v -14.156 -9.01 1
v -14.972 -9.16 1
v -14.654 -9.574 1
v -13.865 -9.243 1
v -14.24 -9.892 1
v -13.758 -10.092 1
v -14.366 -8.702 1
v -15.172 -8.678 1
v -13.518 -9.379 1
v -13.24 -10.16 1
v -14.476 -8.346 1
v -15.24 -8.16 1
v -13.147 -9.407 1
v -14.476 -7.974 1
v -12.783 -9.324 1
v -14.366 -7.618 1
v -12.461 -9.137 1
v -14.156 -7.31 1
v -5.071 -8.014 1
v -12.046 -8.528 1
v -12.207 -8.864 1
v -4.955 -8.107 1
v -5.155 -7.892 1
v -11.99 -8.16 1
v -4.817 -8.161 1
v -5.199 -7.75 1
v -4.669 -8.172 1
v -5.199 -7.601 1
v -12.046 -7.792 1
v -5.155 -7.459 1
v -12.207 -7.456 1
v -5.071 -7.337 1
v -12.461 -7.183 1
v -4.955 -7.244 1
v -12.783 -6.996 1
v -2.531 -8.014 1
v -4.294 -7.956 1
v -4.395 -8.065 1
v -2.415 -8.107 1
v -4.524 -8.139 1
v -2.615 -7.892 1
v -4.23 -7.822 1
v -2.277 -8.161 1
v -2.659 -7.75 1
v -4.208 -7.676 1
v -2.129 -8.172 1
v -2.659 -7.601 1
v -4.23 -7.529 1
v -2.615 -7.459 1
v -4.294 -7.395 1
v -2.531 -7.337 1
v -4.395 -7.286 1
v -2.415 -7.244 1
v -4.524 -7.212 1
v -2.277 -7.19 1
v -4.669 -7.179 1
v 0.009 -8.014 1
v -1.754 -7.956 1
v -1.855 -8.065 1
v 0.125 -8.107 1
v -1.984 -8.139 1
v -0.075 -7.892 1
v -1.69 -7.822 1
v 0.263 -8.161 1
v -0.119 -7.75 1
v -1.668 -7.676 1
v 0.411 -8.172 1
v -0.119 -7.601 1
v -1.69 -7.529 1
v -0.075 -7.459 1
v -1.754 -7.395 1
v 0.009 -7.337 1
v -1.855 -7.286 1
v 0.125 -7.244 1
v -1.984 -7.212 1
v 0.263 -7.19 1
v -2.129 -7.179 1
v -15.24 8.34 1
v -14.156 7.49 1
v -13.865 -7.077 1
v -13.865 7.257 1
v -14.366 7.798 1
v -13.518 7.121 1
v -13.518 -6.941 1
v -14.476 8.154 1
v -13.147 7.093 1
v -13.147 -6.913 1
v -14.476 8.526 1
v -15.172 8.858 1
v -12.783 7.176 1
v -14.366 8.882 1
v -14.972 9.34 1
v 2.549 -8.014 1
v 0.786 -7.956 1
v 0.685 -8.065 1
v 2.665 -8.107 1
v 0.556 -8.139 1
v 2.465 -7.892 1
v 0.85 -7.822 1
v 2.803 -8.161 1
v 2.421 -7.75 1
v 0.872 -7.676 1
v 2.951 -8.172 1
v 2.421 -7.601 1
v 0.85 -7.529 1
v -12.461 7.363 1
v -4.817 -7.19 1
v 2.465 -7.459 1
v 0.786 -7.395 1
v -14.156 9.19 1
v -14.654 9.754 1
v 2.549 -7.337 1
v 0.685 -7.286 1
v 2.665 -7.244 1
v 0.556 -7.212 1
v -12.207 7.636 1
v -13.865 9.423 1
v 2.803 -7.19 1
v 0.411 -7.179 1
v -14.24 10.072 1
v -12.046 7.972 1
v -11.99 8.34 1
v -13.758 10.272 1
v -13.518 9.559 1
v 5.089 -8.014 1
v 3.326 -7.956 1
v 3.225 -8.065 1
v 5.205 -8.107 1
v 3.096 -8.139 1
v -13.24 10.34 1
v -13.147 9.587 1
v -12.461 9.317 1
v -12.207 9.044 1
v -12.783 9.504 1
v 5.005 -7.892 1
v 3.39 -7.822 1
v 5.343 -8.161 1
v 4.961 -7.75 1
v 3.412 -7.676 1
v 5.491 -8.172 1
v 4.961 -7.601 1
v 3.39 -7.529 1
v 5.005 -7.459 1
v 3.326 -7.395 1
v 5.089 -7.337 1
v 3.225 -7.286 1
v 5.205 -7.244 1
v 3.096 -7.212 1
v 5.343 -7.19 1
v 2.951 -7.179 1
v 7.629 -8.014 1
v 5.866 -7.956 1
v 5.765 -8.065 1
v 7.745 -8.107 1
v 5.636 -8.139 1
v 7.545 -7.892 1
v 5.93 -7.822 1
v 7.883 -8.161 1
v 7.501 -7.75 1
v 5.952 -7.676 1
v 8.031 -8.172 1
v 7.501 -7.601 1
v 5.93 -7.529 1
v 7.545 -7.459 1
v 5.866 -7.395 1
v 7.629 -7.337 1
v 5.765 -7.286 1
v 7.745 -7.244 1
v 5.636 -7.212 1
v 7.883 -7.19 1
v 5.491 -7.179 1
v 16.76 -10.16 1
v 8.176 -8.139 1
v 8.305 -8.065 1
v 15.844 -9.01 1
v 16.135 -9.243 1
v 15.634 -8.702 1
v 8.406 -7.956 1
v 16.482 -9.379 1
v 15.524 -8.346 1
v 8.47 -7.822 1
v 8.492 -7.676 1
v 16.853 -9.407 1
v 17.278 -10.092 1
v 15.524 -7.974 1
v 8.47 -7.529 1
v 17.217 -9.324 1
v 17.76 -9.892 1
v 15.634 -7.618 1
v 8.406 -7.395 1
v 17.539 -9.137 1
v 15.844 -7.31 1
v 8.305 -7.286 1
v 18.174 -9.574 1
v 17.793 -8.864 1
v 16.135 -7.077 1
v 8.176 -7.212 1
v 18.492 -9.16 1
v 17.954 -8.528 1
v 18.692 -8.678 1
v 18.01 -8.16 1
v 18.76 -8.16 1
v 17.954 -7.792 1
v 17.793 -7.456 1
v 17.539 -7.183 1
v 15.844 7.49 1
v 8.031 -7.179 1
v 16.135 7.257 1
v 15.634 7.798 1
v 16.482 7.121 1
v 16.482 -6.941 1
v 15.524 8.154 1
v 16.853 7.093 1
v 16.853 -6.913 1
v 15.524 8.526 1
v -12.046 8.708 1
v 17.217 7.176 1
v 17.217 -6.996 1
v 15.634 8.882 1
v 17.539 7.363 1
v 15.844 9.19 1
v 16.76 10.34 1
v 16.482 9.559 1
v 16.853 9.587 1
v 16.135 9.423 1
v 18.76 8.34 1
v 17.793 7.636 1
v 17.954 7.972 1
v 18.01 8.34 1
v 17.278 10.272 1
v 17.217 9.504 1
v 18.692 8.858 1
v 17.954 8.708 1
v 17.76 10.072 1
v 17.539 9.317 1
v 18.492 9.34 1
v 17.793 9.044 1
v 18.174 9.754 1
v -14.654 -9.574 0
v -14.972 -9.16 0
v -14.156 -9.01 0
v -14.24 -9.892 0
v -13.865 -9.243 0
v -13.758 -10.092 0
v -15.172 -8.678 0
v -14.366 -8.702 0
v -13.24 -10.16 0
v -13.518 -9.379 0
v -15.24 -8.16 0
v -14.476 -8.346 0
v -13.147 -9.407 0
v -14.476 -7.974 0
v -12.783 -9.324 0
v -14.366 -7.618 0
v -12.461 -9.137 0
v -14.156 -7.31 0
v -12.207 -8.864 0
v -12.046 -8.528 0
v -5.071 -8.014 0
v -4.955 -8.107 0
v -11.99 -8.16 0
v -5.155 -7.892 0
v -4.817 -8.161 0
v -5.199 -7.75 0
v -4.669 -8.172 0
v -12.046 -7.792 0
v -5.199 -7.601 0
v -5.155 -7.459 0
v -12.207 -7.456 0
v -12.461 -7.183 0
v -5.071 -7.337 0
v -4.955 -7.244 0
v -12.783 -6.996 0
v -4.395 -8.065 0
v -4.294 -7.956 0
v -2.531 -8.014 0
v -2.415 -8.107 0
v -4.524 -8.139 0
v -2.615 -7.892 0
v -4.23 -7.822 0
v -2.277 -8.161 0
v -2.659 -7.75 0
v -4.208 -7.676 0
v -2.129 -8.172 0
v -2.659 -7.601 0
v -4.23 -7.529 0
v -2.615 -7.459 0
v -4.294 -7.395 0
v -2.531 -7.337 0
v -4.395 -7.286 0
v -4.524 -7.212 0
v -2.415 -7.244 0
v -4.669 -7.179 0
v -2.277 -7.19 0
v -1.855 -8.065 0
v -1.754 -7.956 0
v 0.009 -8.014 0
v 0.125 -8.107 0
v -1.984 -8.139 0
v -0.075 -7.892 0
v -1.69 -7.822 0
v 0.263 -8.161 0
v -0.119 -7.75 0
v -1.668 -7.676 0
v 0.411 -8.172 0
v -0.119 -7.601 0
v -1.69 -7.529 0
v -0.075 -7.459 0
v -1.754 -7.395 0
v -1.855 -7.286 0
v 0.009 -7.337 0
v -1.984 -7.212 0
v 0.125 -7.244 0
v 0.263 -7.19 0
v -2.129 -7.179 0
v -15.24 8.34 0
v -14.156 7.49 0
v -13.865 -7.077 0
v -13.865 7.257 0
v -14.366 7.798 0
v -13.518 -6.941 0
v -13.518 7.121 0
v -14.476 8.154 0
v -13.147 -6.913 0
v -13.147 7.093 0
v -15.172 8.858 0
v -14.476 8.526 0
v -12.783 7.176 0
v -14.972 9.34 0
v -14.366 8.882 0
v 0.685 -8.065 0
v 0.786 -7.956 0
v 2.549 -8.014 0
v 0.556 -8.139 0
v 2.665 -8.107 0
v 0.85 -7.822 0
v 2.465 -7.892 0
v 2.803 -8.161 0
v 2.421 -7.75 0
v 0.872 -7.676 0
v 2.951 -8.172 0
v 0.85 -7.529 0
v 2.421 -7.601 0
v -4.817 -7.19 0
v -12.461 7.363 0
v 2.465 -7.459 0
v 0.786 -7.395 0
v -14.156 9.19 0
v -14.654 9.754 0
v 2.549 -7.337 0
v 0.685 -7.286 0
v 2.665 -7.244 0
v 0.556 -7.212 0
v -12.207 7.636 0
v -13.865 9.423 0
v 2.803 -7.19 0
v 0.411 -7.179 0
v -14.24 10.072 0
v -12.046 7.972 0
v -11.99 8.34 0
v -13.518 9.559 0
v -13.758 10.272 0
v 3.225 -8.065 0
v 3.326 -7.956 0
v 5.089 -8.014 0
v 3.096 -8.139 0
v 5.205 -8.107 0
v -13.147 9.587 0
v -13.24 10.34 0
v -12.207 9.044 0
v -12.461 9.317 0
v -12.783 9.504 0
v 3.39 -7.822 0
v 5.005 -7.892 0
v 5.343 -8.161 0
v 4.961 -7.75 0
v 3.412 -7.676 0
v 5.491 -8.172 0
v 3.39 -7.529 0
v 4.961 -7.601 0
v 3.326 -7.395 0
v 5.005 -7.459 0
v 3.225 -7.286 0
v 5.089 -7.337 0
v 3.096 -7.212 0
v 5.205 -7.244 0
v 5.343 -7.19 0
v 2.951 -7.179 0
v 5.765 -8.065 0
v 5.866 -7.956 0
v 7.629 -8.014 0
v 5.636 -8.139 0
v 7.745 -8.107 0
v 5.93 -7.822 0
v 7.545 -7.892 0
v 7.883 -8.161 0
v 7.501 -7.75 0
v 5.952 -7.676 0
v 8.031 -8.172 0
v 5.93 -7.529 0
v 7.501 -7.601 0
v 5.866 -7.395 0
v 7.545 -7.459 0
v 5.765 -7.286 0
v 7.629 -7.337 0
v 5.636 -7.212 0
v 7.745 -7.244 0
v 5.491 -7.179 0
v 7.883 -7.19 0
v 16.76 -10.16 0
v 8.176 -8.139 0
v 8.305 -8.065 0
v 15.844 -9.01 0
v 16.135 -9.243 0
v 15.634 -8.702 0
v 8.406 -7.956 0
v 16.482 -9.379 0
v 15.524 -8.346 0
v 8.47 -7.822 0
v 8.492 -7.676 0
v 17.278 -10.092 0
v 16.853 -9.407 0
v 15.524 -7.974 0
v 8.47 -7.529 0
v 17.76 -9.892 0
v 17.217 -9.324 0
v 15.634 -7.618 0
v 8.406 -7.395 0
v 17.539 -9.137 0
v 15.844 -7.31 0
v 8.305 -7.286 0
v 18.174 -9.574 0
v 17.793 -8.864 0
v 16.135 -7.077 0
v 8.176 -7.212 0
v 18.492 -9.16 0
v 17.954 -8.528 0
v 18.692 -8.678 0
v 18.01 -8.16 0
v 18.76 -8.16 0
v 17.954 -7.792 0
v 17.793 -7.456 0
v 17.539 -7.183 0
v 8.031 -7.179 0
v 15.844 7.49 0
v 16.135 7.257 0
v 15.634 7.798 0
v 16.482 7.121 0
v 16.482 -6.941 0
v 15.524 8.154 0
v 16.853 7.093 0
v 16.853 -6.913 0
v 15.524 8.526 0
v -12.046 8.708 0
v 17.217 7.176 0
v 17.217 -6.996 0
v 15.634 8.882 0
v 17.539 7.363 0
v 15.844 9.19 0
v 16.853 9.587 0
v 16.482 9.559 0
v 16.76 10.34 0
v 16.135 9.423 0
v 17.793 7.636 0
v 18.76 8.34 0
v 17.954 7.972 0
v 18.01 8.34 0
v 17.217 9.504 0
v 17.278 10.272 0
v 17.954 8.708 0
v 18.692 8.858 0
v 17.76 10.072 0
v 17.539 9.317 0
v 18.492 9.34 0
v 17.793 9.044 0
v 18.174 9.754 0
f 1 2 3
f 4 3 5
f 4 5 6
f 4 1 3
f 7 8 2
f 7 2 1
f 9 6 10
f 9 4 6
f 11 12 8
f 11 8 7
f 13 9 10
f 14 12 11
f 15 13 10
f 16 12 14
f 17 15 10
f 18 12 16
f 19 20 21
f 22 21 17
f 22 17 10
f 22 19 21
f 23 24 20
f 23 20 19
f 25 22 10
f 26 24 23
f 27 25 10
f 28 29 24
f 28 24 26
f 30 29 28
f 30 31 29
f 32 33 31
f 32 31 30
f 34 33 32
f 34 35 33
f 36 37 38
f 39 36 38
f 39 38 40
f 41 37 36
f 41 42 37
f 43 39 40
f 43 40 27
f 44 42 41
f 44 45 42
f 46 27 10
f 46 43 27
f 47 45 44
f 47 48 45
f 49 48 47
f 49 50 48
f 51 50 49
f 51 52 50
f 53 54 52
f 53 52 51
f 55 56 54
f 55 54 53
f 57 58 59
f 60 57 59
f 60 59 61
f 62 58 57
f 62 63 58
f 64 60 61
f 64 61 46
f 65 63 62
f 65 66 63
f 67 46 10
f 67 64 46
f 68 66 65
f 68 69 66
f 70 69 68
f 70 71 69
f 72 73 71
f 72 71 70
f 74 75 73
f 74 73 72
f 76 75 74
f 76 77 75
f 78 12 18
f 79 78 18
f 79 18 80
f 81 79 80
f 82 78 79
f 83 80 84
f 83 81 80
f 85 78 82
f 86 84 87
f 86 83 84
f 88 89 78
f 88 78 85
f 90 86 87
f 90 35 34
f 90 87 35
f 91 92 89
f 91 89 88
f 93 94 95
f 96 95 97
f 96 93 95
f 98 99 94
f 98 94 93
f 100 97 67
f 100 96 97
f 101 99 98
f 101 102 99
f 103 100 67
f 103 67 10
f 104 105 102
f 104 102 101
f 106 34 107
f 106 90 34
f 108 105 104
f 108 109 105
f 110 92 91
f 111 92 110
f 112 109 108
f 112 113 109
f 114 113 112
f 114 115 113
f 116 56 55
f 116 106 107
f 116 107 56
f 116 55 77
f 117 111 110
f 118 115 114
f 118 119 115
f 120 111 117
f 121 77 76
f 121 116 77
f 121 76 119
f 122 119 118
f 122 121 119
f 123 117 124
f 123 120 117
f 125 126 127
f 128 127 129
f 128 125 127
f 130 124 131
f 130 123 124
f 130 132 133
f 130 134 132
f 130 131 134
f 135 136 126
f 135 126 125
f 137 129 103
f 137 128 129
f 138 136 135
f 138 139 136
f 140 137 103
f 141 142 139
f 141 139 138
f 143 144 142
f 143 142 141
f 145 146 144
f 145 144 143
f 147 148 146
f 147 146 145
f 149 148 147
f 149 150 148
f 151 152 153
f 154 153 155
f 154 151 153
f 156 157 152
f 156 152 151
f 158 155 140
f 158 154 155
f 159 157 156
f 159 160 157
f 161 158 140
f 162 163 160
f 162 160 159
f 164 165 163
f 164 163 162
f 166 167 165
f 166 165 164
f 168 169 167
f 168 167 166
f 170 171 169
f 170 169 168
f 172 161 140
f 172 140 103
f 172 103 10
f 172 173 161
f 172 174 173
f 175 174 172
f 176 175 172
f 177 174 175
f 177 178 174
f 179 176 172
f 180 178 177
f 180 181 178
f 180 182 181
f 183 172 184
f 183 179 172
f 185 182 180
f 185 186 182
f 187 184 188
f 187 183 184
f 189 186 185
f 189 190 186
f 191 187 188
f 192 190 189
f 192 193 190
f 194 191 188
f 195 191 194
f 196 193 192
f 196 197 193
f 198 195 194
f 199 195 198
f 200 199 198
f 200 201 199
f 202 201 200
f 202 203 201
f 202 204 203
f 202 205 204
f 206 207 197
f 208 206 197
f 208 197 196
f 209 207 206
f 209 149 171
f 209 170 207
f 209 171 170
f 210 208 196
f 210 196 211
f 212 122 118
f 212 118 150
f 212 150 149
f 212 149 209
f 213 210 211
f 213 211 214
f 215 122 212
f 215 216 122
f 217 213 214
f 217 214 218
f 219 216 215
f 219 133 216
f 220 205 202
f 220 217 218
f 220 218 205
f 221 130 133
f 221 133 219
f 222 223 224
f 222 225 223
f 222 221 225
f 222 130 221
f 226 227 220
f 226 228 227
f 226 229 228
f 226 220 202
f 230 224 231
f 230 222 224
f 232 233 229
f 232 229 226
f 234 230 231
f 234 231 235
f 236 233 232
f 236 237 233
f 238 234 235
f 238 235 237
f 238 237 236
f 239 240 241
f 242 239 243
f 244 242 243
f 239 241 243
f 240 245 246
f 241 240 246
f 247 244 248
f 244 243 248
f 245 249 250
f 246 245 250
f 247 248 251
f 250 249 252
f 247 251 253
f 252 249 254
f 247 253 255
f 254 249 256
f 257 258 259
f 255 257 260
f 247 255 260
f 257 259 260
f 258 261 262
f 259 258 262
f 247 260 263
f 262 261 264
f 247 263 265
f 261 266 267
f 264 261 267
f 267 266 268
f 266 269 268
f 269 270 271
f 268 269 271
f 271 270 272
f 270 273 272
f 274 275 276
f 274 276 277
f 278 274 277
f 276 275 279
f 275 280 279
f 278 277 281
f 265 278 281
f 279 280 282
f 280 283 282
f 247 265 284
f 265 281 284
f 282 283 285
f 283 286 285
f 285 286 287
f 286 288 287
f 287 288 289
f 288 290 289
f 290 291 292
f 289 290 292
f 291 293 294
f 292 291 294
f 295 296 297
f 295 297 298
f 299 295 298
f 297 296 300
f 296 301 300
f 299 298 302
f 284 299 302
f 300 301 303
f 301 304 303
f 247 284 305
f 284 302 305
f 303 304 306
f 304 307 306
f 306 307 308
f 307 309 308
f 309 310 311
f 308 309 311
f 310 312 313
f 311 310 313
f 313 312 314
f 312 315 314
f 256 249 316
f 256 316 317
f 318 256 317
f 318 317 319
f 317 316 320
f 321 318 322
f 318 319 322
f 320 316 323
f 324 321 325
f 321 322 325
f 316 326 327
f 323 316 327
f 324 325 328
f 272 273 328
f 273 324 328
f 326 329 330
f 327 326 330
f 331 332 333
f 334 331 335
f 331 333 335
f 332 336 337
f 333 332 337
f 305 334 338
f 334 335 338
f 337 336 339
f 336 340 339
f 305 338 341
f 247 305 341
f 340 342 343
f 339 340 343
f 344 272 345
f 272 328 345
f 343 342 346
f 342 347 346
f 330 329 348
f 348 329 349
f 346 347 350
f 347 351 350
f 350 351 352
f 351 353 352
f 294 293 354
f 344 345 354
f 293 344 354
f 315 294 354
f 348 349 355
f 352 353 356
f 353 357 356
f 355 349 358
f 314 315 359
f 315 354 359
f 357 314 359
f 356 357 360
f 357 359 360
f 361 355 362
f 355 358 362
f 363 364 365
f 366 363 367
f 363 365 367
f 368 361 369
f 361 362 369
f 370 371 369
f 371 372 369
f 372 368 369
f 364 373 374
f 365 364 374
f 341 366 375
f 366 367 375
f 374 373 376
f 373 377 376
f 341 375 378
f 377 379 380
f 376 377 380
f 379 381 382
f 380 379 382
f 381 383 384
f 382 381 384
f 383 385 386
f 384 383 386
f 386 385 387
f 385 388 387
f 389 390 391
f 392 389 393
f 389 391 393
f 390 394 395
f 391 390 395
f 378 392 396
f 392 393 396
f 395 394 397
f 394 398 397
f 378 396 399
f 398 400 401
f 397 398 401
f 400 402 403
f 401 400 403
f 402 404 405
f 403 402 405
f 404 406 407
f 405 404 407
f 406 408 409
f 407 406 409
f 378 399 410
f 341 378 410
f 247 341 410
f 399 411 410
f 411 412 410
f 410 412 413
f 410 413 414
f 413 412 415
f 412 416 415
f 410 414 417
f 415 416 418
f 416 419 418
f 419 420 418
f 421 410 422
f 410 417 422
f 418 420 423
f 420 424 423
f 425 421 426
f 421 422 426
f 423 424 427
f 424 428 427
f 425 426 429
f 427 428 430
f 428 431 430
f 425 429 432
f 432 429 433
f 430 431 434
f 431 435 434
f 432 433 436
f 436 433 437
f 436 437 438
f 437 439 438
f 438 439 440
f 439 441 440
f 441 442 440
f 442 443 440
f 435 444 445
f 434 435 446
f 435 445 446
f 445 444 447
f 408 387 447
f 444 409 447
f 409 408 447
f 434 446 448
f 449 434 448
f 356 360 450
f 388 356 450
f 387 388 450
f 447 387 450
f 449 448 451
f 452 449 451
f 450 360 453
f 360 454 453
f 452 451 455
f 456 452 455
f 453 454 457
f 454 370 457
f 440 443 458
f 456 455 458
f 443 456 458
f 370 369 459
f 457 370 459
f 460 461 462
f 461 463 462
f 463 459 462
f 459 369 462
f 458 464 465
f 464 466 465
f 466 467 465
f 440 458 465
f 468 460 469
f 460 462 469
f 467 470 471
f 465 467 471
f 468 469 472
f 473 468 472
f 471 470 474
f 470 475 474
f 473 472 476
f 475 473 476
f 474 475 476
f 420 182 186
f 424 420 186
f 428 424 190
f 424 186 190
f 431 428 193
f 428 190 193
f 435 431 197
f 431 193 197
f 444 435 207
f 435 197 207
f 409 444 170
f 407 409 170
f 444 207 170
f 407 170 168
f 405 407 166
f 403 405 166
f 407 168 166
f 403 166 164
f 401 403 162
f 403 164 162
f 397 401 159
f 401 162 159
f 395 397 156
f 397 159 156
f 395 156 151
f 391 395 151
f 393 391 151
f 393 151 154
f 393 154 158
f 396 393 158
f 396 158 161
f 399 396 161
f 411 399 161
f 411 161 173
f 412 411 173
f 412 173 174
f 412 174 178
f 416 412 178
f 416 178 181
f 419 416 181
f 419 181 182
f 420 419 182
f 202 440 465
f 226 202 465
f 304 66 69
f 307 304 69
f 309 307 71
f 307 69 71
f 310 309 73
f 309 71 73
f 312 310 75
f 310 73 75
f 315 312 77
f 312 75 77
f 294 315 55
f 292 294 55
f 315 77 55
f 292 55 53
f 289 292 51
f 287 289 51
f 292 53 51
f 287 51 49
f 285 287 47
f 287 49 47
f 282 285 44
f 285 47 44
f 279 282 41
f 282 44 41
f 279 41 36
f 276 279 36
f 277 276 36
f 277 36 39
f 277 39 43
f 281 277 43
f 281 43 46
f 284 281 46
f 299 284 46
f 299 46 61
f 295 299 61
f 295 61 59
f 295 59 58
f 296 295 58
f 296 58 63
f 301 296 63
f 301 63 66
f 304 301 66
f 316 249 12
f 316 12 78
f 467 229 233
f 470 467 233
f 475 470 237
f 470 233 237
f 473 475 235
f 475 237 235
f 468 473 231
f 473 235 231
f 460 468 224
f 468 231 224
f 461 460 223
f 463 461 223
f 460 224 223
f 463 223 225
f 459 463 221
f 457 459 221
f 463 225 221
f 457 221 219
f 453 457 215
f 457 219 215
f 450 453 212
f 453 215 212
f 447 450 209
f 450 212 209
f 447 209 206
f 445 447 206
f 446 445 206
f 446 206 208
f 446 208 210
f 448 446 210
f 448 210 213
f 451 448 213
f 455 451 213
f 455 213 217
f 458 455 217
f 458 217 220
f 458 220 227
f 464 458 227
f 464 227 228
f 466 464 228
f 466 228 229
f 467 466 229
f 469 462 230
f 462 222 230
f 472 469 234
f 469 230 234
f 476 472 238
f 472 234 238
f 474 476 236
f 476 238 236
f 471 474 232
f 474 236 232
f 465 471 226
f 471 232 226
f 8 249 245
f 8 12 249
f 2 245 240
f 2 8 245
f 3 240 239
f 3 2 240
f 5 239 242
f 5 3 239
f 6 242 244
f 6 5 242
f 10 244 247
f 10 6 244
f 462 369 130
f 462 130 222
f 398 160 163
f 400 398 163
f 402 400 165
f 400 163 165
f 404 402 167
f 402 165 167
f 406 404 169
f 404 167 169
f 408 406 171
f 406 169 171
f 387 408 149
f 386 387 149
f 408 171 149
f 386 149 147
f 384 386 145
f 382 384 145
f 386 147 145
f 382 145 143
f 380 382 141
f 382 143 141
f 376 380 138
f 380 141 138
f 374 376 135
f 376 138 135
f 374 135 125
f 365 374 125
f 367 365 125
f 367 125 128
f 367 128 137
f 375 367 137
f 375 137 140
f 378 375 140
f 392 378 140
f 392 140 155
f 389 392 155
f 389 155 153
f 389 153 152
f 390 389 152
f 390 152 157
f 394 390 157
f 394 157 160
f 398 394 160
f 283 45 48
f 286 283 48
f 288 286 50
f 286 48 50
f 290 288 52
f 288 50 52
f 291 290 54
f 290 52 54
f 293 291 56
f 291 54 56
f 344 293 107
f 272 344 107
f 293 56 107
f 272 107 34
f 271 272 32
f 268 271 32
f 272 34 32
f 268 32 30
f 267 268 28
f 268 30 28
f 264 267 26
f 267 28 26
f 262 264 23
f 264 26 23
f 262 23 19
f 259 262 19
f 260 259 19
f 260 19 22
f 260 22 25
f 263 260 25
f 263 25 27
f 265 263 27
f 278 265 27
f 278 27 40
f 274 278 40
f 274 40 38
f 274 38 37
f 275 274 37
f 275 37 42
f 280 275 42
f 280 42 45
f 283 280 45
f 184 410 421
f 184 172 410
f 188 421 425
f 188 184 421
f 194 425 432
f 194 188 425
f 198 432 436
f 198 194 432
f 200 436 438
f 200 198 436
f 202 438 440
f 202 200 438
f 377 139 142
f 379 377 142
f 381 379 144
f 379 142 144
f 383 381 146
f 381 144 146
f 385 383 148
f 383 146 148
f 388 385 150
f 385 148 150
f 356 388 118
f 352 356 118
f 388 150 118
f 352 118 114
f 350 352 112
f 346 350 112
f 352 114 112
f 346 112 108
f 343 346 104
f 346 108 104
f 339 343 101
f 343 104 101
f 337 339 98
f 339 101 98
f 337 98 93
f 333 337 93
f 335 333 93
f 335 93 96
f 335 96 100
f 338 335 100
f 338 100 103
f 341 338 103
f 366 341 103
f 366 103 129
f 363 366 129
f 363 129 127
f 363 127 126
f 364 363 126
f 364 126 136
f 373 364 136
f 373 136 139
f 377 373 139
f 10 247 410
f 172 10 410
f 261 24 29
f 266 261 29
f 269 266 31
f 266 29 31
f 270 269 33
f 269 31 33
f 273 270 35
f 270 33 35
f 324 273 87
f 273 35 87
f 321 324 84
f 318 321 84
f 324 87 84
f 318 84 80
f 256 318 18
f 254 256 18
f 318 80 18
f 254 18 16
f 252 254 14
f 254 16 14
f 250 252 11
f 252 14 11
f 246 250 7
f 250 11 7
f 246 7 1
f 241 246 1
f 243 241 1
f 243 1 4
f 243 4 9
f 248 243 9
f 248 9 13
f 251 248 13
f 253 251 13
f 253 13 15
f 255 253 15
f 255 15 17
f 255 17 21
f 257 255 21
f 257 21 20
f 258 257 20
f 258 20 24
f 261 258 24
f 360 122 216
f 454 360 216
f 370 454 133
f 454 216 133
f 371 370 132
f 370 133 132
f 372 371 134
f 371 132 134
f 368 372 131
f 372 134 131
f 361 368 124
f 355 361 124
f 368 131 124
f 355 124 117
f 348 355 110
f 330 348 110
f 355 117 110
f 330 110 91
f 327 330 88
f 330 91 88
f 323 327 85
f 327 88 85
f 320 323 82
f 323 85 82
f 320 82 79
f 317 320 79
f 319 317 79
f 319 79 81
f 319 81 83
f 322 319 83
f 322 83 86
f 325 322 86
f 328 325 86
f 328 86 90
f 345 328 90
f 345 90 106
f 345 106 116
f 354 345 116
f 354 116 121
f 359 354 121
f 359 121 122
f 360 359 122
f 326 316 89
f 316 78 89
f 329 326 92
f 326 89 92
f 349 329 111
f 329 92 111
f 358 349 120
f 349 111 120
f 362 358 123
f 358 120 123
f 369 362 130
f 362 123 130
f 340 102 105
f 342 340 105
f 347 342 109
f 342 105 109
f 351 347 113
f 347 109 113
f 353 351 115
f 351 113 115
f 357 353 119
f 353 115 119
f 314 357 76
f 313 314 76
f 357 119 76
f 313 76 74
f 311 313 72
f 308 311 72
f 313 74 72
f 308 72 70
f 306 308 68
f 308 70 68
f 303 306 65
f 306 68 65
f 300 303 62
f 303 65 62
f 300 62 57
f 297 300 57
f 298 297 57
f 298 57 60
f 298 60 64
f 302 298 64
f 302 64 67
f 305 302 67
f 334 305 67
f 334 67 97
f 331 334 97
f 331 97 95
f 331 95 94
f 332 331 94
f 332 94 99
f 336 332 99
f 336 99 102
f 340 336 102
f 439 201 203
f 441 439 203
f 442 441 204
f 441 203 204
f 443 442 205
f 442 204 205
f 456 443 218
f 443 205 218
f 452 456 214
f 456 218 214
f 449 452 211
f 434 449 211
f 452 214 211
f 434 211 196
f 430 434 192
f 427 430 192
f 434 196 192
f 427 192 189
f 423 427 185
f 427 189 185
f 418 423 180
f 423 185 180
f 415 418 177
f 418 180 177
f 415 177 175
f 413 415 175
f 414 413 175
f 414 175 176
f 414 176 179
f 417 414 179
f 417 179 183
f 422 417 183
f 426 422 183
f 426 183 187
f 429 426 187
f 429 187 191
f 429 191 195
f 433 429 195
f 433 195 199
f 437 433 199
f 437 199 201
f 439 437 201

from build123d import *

# Parameters (mm, degrees)
SKETCH1_W               = 34
SKETCH1_H               = 20.5
COMPONENT_OUTLINE_DEPTH = 1
CUT_EXTRUDE1_REACH      = 3
SKETCH4_R               = 0.498272188
SKETCH5_R               = 1.25
CUT_EXTRUDE2_DEPTH      = 2
FILLET1_R               = 2


with BuildPart() as part:
    # Sketch1 → Component_Outline (new body)
    with BuildSketch(Plane.XY):
        with Locations((1.76, 0.09)):
            Rectangle(SKETCH1_W, SKETCH1_H)
    extrude(amount=COMPONENT_OUTLINE_DEPTH)

    # Sketch4 → Cut-Extrude1 (cut, up to next)
    with BuildSketch(Plane.XY.offset(1), mode=Mode.PRIVATE) as cut_extrude1_sk1:
        with Locations((-4.706120495, -7.675571956)):
            Circle(SKETCH4_R)
    cut_extrude1_tool1 = extrude(cut_extrude1_sk1.sketch, amount=-CUT_EXTRUDE1_REACH, mode=Mode.PRIVATE) & part.part
    add(cut_extrude1_tool1.solids().sort_by_distance((-4.70612, -7.675572, 1))[0], mode=Mode.SUBTRACT)
    # Sketch4 → Cut-Extrude1 (cut, up to next)
    with BuildSketch(Plane.XY.offset(1), mode=Mode.PRIVATE) as cut_extrude1_sk2:
        with Locations((-2.166120495, -7.675571956)):
            Circle(SKETCH4_R)
    cut_extrude1_tool2 = extrude(cut_extrude1_sk2.sketch, amount=-CUT_EXTRUDE1_REACH, mode=Mode.PRIVATE) & part.part
    add(cut_extrude1_tool2.solids().sort_by_distance((-2.16612, -7.675572, 1))[0], mode=Mode.SUBTRACT)
    # Sketch4 → Cut-Extrude1 (cut, up to next)
    with BuildSketch(Plane.XY.offset(1), mode=Mode.PRIVATE) as cut_extrude1_sk3:
        with Locations((0.373879505, -7.675571956)):
            Circle(SKETCH4_R)
    cut_extrude1_tool3 = extrude(cut_extrude1_sk3.sketch, amount=-CUT_EXTRUDE1_REACH, mode=Mode.PRIVATE) & part.part
    add(cut_extrude1_tool3.solids().sort_by_distance((0.37388, -7.675572, 1))[0], mode=Mode.SUBTRACT)
    # Sketch4 → Cut-Extrude1 (cut, up to next)
    with BuildSketch(Plane.XY.offset(1), mode=Mode.PRIVATE) as cut_extrude1_sk4:
        with Locations((2.913879505, -7.675571956)):
            Circle(SKETCH4_R)
    cut_extrude1_tool4 = extrude(cut_extrude1_sk4.sketch, amount=-CUT_EXTRUDE1_REACH, mode=Mode.PRIVATE) & part.part
    add(cut_extrude1_tool4.solids().sort_by_distance((2.91388, -7.675572, 1))[0], mode=Mode.SUBTRACT)
    # Sketch4 → Cut-Extrude1 (cut, up to next)
    with BuildSketch(Plane.XY.offset(1), mode=Mode.PRIVATE) as cut_extrude1_sk5:
        with Locations((5.453879505, -7.675571956)):
            Circle(SKETCH4_R)
    cut_extrude1_tool5 = extrude(cut_extrude1_sk5.sketch, amount=-CUT_EXTRUDE1_REACH, mode=Mode.PRIVATE) & part.part
    add(cut_extrude1_tool5.solids().sort_by_distance((5.45388, -7.675572, 1))[0], mode=Mode.SUBTRACT)
    # Sketch4 → Cut-Extrude1 (cut, up to next)
    with BuildSketch(Plane.XY.offset(1), mode=Mode.PRIVATE) as cut_extrude1_sk6:
        with Locations((7.993879505, -7.675571956)):
            Circle(SKETCH4_R)
    cut_extrude1_tool6 = extrude(cut_extrude1_sk6.sketch, amount=-CUT_EXTRUDE1_REACH, mode=Mode.PRIVATE) & part.part
    add(cut_extrude1_tool6.solids().sort_by_distance((7.99388, -7.675572, 1))[0], mode=Mode.SUBTRACT)

    # Sketch5 → Cut-Extrude2 (cut, through all)
    with BuildSketch(Plane.XY.offset(1)):
        with Locations((-13.24, 8.34)):
            Circle(SKETCH5_R)
        with Locations((16.76, 8.34)):
            Circle(SKETCH5_R)
        with Locations((16.76, -8.16)):
            Circle(SKETCH5_R)
        with Locations((-13.24, -8.16)):
            Circle(SKETCH5_R)
    extrude(amount=-CUT_EXTRUDE2_DEPTH, mode=Mode.SUBTRACT)

    # Fillet1
    fillet1_edges = [part.edges().sort_by_distance(p)[0] for p in [
        (-15.24, 10.34, 0.5),
        (18.76, 10.34, 0.5),
        (18.76, -10.16, 0.5),
        (-15.24, -10.16, 0.5),
    ]]
    fillet(fillet1_edges, radius=FILLET1_R)


solid = part.part
